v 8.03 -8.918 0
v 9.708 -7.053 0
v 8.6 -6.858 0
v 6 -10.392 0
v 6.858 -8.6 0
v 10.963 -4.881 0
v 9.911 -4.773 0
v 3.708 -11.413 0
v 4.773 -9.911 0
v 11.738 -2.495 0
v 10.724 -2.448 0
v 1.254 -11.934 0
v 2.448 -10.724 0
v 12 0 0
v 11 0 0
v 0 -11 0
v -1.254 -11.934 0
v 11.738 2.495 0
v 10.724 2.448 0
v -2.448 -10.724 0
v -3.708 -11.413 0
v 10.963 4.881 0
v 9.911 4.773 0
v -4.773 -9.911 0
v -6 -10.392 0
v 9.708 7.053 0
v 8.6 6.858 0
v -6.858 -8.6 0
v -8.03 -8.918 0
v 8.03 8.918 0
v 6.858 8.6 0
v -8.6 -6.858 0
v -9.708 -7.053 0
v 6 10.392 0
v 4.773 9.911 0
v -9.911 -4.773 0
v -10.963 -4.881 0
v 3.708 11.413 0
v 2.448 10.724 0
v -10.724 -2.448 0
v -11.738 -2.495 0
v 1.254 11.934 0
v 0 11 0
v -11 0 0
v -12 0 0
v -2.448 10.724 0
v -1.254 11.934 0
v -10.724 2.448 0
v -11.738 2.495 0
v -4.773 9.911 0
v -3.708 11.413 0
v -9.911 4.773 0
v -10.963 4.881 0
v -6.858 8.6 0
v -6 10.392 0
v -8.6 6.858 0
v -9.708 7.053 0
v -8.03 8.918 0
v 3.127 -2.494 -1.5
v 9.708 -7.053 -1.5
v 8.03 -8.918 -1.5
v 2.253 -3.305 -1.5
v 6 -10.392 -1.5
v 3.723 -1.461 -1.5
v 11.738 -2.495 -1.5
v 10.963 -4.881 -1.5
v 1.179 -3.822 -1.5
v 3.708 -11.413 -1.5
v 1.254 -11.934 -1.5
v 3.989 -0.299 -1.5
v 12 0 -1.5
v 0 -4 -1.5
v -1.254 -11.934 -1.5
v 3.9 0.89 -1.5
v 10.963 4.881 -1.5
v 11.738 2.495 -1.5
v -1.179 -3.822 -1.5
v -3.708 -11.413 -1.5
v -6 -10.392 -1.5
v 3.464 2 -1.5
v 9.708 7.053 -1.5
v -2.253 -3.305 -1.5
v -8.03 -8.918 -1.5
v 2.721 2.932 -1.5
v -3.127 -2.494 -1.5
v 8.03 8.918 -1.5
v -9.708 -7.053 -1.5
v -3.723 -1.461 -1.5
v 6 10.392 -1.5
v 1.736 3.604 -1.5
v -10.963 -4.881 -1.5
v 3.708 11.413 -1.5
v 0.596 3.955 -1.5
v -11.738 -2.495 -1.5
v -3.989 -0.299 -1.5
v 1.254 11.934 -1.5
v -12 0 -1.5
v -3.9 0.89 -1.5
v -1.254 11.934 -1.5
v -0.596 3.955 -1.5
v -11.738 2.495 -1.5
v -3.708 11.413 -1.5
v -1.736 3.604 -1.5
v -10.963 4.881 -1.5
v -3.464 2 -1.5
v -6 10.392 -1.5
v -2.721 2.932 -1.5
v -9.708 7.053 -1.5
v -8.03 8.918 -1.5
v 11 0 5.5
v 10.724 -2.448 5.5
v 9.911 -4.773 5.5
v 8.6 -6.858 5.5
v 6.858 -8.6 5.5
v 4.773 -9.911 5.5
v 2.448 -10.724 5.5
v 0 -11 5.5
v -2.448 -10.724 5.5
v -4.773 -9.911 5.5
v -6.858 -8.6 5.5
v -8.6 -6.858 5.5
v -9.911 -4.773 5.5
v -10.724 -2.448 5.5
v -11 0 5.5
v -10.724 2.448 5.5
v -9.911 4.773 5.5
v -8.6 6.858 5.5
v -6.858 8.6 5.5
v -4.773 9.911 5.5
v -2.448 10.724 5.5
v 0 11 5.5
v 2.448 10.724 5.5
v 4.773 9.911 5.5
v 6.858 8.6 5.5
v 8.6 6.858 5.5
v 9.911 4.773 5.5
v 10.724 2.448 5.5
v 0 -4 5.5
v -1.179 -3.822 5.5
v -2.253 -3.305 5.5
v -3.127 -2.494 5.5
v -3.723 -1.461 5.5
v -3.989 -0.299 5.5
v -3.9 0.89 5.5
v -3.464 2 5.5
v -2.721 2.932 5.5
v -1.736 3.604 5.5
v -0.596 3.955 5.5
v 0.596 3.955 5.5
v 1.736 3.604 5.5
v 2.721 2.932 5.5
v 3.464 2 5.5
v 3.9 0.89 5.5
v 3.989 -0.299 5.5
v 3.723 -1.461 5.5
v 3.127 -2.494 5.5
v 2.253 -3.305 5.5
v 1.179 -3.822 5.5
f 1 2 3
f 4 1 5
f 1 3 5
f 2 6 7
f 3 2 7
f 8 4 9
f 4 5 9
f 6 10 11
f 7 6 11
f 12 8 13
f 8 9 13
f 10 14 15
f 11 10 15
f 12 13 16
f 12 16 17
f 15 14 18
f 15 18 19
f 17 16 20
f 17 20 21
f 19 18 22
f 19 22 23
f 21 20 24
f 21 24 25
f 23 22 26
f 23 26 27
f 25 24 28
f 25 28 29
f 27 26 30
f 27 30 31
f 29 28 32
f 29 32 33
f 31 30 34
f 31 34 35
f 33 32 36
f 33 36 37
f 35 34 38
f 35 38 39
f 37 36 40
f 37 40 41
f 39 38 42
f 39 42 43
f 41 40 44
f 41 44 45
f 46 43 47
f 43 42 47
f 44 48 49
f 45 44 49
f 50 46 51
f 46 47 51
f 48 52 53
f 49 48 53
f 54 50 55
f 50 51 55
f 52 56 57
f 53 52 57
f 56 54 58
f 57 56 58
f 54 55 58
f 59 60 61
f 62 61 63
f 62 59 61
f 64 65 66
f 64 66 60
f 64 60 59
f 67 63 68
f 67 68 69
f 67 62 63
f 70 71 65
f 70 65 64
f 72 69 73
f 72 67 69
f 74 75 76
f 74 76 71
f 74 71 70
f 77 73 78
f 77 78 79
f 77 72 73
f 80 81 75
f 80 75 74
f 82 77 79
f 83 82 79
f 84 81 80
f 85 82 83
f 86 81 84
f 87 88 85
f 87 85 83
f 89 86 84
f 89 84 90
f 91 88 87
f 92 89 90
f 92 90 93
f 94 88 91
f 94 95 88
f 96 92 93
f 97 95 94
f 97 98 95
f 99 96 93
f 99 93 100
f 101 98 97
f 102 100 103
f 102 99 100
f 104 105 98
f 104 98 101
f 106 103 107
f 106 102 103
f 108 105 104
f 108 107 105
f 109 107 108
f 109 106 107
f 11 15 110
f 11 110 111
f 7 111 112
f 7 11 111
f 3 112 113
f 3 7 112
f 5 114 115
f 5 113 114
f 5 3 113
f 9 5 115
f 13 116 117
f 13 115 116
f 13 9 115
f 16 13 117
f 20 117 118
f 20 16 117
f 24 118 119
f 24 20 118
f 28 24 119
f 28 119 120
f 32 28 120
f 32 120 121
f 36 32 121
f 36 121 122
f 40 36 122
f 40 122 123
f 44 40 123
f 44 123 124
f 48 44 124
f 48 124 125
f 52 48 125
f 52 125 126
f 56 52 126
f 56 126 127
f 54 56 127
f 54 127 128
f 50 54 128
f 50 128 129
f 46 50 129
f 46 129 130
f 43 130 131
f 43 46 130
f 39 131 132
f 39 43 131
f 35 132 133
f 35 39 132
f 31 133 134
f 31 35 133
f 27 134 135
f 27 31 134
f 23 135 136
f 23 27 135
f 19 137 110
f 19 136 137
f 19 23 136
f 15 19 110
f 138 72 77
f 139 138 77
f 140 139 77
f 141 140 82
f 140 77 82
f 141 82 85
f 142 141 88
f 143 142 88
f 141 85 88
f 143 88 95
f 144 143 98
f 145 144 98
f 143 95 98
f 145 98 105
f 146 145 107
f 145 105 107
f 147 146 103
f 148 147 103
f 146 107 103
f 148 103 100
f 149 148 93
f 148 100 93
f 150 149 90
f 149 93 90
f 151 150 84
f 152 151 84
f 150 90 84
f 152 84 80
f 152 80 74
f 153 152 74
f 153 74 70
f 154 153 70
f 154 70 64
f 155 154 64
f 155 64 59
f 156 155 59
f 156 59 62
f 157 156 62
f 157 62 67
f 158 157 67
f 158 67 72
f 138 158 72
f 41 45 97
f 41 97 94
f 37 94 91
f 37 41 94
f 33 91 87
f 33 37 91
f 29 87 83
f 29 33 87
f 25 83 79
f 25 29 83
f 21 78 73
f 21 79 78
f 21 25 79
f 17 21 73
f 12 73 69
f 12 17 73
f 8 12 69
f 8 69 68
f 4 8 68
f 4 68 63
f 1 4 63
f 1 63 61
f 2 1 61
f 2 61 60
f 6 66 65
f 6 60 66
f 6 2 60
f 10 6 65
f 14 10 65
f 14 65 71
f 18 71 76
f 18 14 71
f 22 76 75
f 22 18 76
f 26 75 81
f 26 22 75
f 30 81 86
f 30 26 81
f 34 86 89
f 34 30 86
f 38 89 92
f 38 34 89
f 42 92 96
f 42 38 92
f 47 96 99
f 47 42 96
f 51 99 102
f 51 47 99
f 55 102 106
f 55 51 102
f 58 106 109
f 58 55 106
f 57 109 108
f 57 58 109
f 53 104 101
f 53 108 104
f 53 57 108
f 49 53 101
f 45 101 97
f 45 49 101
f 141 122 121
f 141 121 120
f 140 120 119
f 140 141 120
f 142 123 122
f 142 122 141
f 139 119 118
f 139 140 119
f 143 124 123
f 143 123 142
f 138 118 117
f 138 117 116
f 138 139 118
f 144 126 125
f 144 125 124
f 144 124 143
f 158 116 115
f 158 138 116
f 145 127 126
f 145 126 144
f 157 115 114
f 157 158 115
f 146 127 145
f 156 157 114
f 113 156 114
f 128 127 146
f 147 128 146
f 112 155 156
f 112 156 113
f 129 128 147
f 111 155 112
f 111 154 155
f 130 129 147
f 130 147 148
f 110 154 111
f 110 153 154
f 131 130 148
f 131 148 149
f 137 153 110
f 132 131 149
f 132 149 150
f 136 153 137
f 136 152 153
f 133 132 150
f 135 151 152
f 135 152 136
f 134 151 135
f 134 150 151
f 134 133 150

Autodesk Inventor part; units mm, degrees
ref_plane "YZ Plane" through (0, 0, 0) normal (1, 0, 0) x (0, 1, 0)
ref_plane "XZ Plane" through (0, 0, 0) normal (0, 1, 0) x (-1, 0, 0)
ref_plane "XY Plane" through (0, 0, 0) normal (0, 0, 1) x (1, 0, 0)
sketch "スケッチ1" plane through (0, 0, 0) normal (0, 0, 1) x (1, 0, 0)
  circle A0 centre (0, 0) radius 11
  dimension "d0" = 22
extrude "押し出し1" add sketch "スケッチ1" along normal blind 5.5
sketch "スケッチ2" plane through (0, 0, 0) normal (0, 0, -1) x (-1, 0, 0)
  circle A0 centre (0, 0) radius 12
  dimension "d3" = 24
extrude "押し出し2" add sketch "スケッチ2" along normal blind 1.5
sketch "スケッチ3" plane through (0, 0, 5.5) normal (0, 0, 1) x (1, 0, 0)
  point P0 (0, 0)
  point P1 (0, 0)
hole "穴1" at (0, 0, 5.5) direction (0, 0, -1) diameter 8 depth 7 tip angle 118
properties part number "玉軸受2 F608ZZ"
